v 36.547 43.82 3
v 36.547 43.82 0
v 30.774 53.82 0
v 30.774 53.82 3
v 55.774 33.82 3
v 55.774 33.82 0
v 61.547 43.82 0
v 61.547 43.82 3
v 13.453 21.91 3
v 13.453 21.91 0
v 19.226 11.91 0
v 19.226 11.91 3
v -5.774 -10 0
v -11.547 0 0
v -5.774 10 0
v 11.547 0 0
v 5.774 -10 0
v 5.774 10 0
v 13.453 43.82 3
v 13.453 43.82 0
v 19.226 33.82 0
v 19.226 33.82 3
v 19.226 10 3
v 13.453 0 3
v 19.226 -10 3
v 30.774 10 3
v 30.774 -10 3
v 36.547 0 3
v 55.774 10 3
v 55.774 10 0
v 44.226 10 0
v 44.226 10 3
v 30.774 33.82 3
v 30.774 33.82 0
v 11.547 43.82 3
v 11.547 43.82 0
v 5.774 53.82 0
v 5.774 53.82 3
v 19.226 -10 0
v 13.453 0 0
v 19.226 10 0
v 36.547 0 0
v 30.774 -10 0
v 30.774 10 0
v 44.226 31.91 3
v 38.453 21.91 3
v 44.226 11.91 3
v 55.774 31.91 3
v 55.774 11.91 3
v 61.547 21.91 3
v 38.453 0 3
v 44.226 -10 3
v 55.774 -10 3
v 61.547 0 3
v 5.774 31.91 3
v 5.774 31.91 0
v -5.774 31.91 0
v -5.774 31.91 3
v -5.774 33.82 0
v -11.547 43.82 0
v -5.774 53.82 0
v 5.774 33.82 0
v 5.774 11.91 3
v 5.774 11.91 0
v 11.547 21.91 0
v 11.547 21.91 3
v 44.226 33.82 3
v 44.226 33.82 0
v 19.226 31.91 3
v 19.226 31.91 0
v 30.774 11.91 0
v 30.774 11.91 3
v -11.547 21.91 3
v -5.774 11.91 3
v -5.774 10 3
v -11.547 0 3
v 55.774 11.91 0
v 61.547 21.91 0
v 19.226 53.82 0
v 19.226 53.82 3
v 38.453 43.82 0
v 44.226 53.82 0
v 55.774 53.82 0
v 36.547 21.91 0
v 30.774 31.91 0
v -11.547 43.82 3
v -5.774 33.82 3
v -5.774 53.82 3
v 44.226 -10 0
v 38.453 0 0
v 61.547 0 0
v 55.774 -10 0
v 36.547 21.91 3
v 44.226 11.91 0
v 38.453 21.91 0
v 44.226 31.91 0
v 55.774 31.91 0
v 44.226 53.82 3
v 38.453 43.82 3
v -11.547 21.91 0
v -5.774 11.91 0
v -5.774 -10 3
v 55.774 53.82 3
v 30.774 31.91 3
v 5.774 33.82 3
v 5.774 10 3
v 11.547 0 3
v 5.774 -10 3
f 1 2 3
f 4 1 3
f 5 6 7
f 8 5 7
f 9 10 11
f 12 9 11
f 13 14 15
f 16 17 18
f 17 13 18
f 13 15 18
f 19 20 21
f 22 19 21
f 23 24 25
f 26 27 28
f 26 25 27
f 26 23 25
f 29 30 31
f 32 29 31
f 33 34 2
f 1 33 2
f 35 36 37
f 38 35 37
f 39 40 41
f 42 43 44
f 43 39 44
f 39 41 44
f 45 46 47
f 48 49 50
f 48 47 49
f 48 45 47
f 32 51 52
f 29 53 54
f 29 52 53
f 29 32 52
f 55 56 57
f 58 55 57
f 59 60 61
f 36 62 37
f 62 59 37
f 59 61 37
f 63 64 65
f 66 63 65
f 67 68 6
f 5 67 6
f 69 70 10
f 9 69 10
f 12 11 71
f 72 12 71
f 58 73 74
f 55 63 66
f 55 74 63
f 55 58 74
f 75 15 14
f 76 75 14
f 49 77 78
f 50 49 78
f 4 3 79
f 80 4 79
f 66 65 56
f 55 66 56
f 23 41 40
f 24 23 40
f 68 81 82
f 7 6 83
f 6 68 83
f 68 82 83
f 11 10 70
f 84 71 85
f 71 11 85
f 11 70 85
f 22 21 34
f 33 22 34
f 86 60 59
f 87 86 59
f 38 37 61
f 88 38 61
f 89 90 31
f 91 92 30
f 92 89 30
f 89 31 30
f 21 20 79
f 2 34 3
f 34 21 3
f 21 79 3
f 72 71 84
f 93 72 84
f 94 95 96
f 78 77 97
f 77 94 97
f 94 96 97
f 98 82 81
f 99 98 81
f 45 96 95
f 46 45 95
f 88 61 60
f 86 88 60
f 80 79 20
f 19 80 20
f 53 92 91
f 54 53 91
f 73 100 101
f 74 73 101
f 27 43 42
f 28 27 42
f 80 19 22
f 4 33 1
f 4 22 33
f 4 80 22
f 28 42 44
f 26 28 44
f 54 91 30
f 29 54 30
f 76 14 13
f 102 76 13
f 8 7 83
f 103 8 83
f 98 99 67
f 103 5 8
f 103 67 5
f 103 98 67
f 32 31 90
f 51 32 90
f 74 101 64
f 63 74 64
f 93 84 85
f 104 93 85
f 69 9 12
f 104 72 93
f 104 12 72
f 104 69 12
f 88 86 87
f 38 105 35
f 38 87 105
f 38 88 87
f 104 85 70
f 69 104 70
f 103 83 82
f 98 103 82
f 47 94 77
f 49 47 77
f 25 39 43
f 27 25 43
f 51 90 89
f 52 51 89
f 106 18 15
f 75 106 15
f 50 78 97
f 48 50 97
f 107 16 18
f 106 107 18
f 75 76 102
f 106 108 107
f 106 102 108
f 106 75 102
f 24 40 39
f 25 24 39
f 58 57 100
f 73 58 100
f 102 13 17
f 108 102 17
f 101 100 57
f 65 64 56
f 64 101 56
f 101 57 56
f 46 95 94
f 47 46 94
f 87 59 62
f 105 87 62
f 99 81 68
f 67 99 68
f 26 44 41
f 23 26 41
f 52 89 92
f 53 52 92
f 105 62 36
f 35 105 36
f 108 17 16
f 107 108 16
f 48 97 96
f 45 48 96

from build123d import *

# Parameters (mm, degrees)
BOSS_EXTRUDE1_DEPTH   = 3
BOSS_EXTRUDE1_2_DEPTH = 3
BOSS_EXTRUDE1_3_DEPTH = 3
BOSS_EXTRUDE1_4_DEPTH = 3
BOSS_EXTRUDE1_5_DEPTH = 3
BOSS_EXTRUDE1_6_DEPTH = 3
BOSS_EXTRUDE1_7_DEPTH = 3
BOSS_EXTRUDE1_8_DEPTH = 3
BOSS_EXTRUDE1_9_DEPTH = 3


with BuildPart() as part:
    # Sketch1 → Boss-Extrude1 (new body)
    with BuildSketch(Plane.XY):
        Polygon((30.773502692, -10), (36.547005384, 0), (30.773502692, 10), (19.226497308, 10), (13.452994616, 0), (19.226497308, -10), align=None)
    extrude(amount=BOSS_EXTRUDE1_DEPTH)


with BuildPart() as body_2:
    # Sketch1 → Boss-Extrude1 2 (new body)
    with BuildSketch(Plane.XY):
        Polygon((5.773502692, -10), (11.547005384, 0), (5.773502692, 10), (-5.773502692, 10), (-11.547005384, 0), (-5.773502692, -10), align=None)
    extrude(amount=BOSS_EXTRUDE1_2_DEPTH)


with BuildPart() as body_3:
    # Sketch1 → Boss-Extrude1 3 (new body)
    with BuildSketch(Plane.XY):
        Polygon((55.773502692, -10), (61.547005384, 0), (55.773502692, 10), (44.226497308, 10), (38.452994616, 0), (44.226497308, -10), align=None)
    extrude(amount=BOSS_EXTRUDE1_3_DEPTH)


with BuildPart() as body_4:
    # Sketch1 → Boss-Extrude1 4 (new body)
    with BuildSketch(Plane.XY):
        Polygon((30.773502692, 11.91), (36.547005384, 21.91), (30.773502692, 31.91), (19.226497308, 31.91), (13.452994616, 21.91), (19.226497308, 11.91), align=None)
    extrude(amount=BOSS_EXTRUDE1_4_DEPTH)


with BuildPart() as body_5:
    # Sketch1 → Boss-Extrude1 5 (new body)
    with BuildSketch(Plane.XY):
        Polygon((5.773502692, 11.91), (11.547005384, 21.91), (5.773502692, 31.91), (-5.773502692, 31.91), (-11.547005384, 21.91), (-5.773502692, 11.91), align=None)
    extrude(amount=BOSS_EXTRUDE1_5_DEPTH)


with BuildPart() as body_6:
    # Sketch1 → Boss-Extrude1 6 (new body)
    with BuildSketch(Plane.XY):
        Polygon((55.773502692, 11.91), (61.547005384, 21.91), (55.773502692, 31.91), (44.226497308, 31.91), (38.452994616, 21.91), (44.226497308, 11.91), align=None)
    extrude(amount=BOSS_EXTRUDE1_6_DEPTH)


with BuildPart() as body_7:
    # Sketch1 → Boss-Extrude1 7 (new body)
    with BuildSketch(Plane.XY):
        Polygon((30.773502692, 33.82), (36.547005384, 43.82), (30.773502692, 53.82), (19.226497308, 53.82), (13.452994616, 43.82), (19.226497308, 33.82), align=None)
    extrude(amount=BOSS_EXTRUDE1_7_DEPTH)


with BuildPart() as body_8:
    # Sketch1 → Boss-Extrude1 8 (new body)
    with BuildSketch(Plane.XY):
        Polygon((5.773502692, 33.82), (11.547005384, 43.82), (5.773502692, 53.82), (-5.773502692, 53.82), (-11.547005384, 43.82), (-5.773502692, 33.82), align=None)
    extrude(amount=BOSS_EXTRUDE1_8_DEPTH)


with BuildPart() as body_9:
    # Sketch1 → Boss-Extrude1 9 (new body)
    with BuildSketch(Plane.XY):
        Polygon((55.773502692, 33.82), (61.547005384, 43.82), (55.773502692, 53.82), (44.226497308, 53.82), (38.452994616, 43.82), (44.226497308, 33.82), align=None)
    extrude(amount=BOSS_EXTRUDE1_9_DEPTH)


solid = Compound([part.part, body_2.part, body_3.part, body_4.part, body_5.part, body_6.part, body_7.part, body_8.part, body_9.part])
